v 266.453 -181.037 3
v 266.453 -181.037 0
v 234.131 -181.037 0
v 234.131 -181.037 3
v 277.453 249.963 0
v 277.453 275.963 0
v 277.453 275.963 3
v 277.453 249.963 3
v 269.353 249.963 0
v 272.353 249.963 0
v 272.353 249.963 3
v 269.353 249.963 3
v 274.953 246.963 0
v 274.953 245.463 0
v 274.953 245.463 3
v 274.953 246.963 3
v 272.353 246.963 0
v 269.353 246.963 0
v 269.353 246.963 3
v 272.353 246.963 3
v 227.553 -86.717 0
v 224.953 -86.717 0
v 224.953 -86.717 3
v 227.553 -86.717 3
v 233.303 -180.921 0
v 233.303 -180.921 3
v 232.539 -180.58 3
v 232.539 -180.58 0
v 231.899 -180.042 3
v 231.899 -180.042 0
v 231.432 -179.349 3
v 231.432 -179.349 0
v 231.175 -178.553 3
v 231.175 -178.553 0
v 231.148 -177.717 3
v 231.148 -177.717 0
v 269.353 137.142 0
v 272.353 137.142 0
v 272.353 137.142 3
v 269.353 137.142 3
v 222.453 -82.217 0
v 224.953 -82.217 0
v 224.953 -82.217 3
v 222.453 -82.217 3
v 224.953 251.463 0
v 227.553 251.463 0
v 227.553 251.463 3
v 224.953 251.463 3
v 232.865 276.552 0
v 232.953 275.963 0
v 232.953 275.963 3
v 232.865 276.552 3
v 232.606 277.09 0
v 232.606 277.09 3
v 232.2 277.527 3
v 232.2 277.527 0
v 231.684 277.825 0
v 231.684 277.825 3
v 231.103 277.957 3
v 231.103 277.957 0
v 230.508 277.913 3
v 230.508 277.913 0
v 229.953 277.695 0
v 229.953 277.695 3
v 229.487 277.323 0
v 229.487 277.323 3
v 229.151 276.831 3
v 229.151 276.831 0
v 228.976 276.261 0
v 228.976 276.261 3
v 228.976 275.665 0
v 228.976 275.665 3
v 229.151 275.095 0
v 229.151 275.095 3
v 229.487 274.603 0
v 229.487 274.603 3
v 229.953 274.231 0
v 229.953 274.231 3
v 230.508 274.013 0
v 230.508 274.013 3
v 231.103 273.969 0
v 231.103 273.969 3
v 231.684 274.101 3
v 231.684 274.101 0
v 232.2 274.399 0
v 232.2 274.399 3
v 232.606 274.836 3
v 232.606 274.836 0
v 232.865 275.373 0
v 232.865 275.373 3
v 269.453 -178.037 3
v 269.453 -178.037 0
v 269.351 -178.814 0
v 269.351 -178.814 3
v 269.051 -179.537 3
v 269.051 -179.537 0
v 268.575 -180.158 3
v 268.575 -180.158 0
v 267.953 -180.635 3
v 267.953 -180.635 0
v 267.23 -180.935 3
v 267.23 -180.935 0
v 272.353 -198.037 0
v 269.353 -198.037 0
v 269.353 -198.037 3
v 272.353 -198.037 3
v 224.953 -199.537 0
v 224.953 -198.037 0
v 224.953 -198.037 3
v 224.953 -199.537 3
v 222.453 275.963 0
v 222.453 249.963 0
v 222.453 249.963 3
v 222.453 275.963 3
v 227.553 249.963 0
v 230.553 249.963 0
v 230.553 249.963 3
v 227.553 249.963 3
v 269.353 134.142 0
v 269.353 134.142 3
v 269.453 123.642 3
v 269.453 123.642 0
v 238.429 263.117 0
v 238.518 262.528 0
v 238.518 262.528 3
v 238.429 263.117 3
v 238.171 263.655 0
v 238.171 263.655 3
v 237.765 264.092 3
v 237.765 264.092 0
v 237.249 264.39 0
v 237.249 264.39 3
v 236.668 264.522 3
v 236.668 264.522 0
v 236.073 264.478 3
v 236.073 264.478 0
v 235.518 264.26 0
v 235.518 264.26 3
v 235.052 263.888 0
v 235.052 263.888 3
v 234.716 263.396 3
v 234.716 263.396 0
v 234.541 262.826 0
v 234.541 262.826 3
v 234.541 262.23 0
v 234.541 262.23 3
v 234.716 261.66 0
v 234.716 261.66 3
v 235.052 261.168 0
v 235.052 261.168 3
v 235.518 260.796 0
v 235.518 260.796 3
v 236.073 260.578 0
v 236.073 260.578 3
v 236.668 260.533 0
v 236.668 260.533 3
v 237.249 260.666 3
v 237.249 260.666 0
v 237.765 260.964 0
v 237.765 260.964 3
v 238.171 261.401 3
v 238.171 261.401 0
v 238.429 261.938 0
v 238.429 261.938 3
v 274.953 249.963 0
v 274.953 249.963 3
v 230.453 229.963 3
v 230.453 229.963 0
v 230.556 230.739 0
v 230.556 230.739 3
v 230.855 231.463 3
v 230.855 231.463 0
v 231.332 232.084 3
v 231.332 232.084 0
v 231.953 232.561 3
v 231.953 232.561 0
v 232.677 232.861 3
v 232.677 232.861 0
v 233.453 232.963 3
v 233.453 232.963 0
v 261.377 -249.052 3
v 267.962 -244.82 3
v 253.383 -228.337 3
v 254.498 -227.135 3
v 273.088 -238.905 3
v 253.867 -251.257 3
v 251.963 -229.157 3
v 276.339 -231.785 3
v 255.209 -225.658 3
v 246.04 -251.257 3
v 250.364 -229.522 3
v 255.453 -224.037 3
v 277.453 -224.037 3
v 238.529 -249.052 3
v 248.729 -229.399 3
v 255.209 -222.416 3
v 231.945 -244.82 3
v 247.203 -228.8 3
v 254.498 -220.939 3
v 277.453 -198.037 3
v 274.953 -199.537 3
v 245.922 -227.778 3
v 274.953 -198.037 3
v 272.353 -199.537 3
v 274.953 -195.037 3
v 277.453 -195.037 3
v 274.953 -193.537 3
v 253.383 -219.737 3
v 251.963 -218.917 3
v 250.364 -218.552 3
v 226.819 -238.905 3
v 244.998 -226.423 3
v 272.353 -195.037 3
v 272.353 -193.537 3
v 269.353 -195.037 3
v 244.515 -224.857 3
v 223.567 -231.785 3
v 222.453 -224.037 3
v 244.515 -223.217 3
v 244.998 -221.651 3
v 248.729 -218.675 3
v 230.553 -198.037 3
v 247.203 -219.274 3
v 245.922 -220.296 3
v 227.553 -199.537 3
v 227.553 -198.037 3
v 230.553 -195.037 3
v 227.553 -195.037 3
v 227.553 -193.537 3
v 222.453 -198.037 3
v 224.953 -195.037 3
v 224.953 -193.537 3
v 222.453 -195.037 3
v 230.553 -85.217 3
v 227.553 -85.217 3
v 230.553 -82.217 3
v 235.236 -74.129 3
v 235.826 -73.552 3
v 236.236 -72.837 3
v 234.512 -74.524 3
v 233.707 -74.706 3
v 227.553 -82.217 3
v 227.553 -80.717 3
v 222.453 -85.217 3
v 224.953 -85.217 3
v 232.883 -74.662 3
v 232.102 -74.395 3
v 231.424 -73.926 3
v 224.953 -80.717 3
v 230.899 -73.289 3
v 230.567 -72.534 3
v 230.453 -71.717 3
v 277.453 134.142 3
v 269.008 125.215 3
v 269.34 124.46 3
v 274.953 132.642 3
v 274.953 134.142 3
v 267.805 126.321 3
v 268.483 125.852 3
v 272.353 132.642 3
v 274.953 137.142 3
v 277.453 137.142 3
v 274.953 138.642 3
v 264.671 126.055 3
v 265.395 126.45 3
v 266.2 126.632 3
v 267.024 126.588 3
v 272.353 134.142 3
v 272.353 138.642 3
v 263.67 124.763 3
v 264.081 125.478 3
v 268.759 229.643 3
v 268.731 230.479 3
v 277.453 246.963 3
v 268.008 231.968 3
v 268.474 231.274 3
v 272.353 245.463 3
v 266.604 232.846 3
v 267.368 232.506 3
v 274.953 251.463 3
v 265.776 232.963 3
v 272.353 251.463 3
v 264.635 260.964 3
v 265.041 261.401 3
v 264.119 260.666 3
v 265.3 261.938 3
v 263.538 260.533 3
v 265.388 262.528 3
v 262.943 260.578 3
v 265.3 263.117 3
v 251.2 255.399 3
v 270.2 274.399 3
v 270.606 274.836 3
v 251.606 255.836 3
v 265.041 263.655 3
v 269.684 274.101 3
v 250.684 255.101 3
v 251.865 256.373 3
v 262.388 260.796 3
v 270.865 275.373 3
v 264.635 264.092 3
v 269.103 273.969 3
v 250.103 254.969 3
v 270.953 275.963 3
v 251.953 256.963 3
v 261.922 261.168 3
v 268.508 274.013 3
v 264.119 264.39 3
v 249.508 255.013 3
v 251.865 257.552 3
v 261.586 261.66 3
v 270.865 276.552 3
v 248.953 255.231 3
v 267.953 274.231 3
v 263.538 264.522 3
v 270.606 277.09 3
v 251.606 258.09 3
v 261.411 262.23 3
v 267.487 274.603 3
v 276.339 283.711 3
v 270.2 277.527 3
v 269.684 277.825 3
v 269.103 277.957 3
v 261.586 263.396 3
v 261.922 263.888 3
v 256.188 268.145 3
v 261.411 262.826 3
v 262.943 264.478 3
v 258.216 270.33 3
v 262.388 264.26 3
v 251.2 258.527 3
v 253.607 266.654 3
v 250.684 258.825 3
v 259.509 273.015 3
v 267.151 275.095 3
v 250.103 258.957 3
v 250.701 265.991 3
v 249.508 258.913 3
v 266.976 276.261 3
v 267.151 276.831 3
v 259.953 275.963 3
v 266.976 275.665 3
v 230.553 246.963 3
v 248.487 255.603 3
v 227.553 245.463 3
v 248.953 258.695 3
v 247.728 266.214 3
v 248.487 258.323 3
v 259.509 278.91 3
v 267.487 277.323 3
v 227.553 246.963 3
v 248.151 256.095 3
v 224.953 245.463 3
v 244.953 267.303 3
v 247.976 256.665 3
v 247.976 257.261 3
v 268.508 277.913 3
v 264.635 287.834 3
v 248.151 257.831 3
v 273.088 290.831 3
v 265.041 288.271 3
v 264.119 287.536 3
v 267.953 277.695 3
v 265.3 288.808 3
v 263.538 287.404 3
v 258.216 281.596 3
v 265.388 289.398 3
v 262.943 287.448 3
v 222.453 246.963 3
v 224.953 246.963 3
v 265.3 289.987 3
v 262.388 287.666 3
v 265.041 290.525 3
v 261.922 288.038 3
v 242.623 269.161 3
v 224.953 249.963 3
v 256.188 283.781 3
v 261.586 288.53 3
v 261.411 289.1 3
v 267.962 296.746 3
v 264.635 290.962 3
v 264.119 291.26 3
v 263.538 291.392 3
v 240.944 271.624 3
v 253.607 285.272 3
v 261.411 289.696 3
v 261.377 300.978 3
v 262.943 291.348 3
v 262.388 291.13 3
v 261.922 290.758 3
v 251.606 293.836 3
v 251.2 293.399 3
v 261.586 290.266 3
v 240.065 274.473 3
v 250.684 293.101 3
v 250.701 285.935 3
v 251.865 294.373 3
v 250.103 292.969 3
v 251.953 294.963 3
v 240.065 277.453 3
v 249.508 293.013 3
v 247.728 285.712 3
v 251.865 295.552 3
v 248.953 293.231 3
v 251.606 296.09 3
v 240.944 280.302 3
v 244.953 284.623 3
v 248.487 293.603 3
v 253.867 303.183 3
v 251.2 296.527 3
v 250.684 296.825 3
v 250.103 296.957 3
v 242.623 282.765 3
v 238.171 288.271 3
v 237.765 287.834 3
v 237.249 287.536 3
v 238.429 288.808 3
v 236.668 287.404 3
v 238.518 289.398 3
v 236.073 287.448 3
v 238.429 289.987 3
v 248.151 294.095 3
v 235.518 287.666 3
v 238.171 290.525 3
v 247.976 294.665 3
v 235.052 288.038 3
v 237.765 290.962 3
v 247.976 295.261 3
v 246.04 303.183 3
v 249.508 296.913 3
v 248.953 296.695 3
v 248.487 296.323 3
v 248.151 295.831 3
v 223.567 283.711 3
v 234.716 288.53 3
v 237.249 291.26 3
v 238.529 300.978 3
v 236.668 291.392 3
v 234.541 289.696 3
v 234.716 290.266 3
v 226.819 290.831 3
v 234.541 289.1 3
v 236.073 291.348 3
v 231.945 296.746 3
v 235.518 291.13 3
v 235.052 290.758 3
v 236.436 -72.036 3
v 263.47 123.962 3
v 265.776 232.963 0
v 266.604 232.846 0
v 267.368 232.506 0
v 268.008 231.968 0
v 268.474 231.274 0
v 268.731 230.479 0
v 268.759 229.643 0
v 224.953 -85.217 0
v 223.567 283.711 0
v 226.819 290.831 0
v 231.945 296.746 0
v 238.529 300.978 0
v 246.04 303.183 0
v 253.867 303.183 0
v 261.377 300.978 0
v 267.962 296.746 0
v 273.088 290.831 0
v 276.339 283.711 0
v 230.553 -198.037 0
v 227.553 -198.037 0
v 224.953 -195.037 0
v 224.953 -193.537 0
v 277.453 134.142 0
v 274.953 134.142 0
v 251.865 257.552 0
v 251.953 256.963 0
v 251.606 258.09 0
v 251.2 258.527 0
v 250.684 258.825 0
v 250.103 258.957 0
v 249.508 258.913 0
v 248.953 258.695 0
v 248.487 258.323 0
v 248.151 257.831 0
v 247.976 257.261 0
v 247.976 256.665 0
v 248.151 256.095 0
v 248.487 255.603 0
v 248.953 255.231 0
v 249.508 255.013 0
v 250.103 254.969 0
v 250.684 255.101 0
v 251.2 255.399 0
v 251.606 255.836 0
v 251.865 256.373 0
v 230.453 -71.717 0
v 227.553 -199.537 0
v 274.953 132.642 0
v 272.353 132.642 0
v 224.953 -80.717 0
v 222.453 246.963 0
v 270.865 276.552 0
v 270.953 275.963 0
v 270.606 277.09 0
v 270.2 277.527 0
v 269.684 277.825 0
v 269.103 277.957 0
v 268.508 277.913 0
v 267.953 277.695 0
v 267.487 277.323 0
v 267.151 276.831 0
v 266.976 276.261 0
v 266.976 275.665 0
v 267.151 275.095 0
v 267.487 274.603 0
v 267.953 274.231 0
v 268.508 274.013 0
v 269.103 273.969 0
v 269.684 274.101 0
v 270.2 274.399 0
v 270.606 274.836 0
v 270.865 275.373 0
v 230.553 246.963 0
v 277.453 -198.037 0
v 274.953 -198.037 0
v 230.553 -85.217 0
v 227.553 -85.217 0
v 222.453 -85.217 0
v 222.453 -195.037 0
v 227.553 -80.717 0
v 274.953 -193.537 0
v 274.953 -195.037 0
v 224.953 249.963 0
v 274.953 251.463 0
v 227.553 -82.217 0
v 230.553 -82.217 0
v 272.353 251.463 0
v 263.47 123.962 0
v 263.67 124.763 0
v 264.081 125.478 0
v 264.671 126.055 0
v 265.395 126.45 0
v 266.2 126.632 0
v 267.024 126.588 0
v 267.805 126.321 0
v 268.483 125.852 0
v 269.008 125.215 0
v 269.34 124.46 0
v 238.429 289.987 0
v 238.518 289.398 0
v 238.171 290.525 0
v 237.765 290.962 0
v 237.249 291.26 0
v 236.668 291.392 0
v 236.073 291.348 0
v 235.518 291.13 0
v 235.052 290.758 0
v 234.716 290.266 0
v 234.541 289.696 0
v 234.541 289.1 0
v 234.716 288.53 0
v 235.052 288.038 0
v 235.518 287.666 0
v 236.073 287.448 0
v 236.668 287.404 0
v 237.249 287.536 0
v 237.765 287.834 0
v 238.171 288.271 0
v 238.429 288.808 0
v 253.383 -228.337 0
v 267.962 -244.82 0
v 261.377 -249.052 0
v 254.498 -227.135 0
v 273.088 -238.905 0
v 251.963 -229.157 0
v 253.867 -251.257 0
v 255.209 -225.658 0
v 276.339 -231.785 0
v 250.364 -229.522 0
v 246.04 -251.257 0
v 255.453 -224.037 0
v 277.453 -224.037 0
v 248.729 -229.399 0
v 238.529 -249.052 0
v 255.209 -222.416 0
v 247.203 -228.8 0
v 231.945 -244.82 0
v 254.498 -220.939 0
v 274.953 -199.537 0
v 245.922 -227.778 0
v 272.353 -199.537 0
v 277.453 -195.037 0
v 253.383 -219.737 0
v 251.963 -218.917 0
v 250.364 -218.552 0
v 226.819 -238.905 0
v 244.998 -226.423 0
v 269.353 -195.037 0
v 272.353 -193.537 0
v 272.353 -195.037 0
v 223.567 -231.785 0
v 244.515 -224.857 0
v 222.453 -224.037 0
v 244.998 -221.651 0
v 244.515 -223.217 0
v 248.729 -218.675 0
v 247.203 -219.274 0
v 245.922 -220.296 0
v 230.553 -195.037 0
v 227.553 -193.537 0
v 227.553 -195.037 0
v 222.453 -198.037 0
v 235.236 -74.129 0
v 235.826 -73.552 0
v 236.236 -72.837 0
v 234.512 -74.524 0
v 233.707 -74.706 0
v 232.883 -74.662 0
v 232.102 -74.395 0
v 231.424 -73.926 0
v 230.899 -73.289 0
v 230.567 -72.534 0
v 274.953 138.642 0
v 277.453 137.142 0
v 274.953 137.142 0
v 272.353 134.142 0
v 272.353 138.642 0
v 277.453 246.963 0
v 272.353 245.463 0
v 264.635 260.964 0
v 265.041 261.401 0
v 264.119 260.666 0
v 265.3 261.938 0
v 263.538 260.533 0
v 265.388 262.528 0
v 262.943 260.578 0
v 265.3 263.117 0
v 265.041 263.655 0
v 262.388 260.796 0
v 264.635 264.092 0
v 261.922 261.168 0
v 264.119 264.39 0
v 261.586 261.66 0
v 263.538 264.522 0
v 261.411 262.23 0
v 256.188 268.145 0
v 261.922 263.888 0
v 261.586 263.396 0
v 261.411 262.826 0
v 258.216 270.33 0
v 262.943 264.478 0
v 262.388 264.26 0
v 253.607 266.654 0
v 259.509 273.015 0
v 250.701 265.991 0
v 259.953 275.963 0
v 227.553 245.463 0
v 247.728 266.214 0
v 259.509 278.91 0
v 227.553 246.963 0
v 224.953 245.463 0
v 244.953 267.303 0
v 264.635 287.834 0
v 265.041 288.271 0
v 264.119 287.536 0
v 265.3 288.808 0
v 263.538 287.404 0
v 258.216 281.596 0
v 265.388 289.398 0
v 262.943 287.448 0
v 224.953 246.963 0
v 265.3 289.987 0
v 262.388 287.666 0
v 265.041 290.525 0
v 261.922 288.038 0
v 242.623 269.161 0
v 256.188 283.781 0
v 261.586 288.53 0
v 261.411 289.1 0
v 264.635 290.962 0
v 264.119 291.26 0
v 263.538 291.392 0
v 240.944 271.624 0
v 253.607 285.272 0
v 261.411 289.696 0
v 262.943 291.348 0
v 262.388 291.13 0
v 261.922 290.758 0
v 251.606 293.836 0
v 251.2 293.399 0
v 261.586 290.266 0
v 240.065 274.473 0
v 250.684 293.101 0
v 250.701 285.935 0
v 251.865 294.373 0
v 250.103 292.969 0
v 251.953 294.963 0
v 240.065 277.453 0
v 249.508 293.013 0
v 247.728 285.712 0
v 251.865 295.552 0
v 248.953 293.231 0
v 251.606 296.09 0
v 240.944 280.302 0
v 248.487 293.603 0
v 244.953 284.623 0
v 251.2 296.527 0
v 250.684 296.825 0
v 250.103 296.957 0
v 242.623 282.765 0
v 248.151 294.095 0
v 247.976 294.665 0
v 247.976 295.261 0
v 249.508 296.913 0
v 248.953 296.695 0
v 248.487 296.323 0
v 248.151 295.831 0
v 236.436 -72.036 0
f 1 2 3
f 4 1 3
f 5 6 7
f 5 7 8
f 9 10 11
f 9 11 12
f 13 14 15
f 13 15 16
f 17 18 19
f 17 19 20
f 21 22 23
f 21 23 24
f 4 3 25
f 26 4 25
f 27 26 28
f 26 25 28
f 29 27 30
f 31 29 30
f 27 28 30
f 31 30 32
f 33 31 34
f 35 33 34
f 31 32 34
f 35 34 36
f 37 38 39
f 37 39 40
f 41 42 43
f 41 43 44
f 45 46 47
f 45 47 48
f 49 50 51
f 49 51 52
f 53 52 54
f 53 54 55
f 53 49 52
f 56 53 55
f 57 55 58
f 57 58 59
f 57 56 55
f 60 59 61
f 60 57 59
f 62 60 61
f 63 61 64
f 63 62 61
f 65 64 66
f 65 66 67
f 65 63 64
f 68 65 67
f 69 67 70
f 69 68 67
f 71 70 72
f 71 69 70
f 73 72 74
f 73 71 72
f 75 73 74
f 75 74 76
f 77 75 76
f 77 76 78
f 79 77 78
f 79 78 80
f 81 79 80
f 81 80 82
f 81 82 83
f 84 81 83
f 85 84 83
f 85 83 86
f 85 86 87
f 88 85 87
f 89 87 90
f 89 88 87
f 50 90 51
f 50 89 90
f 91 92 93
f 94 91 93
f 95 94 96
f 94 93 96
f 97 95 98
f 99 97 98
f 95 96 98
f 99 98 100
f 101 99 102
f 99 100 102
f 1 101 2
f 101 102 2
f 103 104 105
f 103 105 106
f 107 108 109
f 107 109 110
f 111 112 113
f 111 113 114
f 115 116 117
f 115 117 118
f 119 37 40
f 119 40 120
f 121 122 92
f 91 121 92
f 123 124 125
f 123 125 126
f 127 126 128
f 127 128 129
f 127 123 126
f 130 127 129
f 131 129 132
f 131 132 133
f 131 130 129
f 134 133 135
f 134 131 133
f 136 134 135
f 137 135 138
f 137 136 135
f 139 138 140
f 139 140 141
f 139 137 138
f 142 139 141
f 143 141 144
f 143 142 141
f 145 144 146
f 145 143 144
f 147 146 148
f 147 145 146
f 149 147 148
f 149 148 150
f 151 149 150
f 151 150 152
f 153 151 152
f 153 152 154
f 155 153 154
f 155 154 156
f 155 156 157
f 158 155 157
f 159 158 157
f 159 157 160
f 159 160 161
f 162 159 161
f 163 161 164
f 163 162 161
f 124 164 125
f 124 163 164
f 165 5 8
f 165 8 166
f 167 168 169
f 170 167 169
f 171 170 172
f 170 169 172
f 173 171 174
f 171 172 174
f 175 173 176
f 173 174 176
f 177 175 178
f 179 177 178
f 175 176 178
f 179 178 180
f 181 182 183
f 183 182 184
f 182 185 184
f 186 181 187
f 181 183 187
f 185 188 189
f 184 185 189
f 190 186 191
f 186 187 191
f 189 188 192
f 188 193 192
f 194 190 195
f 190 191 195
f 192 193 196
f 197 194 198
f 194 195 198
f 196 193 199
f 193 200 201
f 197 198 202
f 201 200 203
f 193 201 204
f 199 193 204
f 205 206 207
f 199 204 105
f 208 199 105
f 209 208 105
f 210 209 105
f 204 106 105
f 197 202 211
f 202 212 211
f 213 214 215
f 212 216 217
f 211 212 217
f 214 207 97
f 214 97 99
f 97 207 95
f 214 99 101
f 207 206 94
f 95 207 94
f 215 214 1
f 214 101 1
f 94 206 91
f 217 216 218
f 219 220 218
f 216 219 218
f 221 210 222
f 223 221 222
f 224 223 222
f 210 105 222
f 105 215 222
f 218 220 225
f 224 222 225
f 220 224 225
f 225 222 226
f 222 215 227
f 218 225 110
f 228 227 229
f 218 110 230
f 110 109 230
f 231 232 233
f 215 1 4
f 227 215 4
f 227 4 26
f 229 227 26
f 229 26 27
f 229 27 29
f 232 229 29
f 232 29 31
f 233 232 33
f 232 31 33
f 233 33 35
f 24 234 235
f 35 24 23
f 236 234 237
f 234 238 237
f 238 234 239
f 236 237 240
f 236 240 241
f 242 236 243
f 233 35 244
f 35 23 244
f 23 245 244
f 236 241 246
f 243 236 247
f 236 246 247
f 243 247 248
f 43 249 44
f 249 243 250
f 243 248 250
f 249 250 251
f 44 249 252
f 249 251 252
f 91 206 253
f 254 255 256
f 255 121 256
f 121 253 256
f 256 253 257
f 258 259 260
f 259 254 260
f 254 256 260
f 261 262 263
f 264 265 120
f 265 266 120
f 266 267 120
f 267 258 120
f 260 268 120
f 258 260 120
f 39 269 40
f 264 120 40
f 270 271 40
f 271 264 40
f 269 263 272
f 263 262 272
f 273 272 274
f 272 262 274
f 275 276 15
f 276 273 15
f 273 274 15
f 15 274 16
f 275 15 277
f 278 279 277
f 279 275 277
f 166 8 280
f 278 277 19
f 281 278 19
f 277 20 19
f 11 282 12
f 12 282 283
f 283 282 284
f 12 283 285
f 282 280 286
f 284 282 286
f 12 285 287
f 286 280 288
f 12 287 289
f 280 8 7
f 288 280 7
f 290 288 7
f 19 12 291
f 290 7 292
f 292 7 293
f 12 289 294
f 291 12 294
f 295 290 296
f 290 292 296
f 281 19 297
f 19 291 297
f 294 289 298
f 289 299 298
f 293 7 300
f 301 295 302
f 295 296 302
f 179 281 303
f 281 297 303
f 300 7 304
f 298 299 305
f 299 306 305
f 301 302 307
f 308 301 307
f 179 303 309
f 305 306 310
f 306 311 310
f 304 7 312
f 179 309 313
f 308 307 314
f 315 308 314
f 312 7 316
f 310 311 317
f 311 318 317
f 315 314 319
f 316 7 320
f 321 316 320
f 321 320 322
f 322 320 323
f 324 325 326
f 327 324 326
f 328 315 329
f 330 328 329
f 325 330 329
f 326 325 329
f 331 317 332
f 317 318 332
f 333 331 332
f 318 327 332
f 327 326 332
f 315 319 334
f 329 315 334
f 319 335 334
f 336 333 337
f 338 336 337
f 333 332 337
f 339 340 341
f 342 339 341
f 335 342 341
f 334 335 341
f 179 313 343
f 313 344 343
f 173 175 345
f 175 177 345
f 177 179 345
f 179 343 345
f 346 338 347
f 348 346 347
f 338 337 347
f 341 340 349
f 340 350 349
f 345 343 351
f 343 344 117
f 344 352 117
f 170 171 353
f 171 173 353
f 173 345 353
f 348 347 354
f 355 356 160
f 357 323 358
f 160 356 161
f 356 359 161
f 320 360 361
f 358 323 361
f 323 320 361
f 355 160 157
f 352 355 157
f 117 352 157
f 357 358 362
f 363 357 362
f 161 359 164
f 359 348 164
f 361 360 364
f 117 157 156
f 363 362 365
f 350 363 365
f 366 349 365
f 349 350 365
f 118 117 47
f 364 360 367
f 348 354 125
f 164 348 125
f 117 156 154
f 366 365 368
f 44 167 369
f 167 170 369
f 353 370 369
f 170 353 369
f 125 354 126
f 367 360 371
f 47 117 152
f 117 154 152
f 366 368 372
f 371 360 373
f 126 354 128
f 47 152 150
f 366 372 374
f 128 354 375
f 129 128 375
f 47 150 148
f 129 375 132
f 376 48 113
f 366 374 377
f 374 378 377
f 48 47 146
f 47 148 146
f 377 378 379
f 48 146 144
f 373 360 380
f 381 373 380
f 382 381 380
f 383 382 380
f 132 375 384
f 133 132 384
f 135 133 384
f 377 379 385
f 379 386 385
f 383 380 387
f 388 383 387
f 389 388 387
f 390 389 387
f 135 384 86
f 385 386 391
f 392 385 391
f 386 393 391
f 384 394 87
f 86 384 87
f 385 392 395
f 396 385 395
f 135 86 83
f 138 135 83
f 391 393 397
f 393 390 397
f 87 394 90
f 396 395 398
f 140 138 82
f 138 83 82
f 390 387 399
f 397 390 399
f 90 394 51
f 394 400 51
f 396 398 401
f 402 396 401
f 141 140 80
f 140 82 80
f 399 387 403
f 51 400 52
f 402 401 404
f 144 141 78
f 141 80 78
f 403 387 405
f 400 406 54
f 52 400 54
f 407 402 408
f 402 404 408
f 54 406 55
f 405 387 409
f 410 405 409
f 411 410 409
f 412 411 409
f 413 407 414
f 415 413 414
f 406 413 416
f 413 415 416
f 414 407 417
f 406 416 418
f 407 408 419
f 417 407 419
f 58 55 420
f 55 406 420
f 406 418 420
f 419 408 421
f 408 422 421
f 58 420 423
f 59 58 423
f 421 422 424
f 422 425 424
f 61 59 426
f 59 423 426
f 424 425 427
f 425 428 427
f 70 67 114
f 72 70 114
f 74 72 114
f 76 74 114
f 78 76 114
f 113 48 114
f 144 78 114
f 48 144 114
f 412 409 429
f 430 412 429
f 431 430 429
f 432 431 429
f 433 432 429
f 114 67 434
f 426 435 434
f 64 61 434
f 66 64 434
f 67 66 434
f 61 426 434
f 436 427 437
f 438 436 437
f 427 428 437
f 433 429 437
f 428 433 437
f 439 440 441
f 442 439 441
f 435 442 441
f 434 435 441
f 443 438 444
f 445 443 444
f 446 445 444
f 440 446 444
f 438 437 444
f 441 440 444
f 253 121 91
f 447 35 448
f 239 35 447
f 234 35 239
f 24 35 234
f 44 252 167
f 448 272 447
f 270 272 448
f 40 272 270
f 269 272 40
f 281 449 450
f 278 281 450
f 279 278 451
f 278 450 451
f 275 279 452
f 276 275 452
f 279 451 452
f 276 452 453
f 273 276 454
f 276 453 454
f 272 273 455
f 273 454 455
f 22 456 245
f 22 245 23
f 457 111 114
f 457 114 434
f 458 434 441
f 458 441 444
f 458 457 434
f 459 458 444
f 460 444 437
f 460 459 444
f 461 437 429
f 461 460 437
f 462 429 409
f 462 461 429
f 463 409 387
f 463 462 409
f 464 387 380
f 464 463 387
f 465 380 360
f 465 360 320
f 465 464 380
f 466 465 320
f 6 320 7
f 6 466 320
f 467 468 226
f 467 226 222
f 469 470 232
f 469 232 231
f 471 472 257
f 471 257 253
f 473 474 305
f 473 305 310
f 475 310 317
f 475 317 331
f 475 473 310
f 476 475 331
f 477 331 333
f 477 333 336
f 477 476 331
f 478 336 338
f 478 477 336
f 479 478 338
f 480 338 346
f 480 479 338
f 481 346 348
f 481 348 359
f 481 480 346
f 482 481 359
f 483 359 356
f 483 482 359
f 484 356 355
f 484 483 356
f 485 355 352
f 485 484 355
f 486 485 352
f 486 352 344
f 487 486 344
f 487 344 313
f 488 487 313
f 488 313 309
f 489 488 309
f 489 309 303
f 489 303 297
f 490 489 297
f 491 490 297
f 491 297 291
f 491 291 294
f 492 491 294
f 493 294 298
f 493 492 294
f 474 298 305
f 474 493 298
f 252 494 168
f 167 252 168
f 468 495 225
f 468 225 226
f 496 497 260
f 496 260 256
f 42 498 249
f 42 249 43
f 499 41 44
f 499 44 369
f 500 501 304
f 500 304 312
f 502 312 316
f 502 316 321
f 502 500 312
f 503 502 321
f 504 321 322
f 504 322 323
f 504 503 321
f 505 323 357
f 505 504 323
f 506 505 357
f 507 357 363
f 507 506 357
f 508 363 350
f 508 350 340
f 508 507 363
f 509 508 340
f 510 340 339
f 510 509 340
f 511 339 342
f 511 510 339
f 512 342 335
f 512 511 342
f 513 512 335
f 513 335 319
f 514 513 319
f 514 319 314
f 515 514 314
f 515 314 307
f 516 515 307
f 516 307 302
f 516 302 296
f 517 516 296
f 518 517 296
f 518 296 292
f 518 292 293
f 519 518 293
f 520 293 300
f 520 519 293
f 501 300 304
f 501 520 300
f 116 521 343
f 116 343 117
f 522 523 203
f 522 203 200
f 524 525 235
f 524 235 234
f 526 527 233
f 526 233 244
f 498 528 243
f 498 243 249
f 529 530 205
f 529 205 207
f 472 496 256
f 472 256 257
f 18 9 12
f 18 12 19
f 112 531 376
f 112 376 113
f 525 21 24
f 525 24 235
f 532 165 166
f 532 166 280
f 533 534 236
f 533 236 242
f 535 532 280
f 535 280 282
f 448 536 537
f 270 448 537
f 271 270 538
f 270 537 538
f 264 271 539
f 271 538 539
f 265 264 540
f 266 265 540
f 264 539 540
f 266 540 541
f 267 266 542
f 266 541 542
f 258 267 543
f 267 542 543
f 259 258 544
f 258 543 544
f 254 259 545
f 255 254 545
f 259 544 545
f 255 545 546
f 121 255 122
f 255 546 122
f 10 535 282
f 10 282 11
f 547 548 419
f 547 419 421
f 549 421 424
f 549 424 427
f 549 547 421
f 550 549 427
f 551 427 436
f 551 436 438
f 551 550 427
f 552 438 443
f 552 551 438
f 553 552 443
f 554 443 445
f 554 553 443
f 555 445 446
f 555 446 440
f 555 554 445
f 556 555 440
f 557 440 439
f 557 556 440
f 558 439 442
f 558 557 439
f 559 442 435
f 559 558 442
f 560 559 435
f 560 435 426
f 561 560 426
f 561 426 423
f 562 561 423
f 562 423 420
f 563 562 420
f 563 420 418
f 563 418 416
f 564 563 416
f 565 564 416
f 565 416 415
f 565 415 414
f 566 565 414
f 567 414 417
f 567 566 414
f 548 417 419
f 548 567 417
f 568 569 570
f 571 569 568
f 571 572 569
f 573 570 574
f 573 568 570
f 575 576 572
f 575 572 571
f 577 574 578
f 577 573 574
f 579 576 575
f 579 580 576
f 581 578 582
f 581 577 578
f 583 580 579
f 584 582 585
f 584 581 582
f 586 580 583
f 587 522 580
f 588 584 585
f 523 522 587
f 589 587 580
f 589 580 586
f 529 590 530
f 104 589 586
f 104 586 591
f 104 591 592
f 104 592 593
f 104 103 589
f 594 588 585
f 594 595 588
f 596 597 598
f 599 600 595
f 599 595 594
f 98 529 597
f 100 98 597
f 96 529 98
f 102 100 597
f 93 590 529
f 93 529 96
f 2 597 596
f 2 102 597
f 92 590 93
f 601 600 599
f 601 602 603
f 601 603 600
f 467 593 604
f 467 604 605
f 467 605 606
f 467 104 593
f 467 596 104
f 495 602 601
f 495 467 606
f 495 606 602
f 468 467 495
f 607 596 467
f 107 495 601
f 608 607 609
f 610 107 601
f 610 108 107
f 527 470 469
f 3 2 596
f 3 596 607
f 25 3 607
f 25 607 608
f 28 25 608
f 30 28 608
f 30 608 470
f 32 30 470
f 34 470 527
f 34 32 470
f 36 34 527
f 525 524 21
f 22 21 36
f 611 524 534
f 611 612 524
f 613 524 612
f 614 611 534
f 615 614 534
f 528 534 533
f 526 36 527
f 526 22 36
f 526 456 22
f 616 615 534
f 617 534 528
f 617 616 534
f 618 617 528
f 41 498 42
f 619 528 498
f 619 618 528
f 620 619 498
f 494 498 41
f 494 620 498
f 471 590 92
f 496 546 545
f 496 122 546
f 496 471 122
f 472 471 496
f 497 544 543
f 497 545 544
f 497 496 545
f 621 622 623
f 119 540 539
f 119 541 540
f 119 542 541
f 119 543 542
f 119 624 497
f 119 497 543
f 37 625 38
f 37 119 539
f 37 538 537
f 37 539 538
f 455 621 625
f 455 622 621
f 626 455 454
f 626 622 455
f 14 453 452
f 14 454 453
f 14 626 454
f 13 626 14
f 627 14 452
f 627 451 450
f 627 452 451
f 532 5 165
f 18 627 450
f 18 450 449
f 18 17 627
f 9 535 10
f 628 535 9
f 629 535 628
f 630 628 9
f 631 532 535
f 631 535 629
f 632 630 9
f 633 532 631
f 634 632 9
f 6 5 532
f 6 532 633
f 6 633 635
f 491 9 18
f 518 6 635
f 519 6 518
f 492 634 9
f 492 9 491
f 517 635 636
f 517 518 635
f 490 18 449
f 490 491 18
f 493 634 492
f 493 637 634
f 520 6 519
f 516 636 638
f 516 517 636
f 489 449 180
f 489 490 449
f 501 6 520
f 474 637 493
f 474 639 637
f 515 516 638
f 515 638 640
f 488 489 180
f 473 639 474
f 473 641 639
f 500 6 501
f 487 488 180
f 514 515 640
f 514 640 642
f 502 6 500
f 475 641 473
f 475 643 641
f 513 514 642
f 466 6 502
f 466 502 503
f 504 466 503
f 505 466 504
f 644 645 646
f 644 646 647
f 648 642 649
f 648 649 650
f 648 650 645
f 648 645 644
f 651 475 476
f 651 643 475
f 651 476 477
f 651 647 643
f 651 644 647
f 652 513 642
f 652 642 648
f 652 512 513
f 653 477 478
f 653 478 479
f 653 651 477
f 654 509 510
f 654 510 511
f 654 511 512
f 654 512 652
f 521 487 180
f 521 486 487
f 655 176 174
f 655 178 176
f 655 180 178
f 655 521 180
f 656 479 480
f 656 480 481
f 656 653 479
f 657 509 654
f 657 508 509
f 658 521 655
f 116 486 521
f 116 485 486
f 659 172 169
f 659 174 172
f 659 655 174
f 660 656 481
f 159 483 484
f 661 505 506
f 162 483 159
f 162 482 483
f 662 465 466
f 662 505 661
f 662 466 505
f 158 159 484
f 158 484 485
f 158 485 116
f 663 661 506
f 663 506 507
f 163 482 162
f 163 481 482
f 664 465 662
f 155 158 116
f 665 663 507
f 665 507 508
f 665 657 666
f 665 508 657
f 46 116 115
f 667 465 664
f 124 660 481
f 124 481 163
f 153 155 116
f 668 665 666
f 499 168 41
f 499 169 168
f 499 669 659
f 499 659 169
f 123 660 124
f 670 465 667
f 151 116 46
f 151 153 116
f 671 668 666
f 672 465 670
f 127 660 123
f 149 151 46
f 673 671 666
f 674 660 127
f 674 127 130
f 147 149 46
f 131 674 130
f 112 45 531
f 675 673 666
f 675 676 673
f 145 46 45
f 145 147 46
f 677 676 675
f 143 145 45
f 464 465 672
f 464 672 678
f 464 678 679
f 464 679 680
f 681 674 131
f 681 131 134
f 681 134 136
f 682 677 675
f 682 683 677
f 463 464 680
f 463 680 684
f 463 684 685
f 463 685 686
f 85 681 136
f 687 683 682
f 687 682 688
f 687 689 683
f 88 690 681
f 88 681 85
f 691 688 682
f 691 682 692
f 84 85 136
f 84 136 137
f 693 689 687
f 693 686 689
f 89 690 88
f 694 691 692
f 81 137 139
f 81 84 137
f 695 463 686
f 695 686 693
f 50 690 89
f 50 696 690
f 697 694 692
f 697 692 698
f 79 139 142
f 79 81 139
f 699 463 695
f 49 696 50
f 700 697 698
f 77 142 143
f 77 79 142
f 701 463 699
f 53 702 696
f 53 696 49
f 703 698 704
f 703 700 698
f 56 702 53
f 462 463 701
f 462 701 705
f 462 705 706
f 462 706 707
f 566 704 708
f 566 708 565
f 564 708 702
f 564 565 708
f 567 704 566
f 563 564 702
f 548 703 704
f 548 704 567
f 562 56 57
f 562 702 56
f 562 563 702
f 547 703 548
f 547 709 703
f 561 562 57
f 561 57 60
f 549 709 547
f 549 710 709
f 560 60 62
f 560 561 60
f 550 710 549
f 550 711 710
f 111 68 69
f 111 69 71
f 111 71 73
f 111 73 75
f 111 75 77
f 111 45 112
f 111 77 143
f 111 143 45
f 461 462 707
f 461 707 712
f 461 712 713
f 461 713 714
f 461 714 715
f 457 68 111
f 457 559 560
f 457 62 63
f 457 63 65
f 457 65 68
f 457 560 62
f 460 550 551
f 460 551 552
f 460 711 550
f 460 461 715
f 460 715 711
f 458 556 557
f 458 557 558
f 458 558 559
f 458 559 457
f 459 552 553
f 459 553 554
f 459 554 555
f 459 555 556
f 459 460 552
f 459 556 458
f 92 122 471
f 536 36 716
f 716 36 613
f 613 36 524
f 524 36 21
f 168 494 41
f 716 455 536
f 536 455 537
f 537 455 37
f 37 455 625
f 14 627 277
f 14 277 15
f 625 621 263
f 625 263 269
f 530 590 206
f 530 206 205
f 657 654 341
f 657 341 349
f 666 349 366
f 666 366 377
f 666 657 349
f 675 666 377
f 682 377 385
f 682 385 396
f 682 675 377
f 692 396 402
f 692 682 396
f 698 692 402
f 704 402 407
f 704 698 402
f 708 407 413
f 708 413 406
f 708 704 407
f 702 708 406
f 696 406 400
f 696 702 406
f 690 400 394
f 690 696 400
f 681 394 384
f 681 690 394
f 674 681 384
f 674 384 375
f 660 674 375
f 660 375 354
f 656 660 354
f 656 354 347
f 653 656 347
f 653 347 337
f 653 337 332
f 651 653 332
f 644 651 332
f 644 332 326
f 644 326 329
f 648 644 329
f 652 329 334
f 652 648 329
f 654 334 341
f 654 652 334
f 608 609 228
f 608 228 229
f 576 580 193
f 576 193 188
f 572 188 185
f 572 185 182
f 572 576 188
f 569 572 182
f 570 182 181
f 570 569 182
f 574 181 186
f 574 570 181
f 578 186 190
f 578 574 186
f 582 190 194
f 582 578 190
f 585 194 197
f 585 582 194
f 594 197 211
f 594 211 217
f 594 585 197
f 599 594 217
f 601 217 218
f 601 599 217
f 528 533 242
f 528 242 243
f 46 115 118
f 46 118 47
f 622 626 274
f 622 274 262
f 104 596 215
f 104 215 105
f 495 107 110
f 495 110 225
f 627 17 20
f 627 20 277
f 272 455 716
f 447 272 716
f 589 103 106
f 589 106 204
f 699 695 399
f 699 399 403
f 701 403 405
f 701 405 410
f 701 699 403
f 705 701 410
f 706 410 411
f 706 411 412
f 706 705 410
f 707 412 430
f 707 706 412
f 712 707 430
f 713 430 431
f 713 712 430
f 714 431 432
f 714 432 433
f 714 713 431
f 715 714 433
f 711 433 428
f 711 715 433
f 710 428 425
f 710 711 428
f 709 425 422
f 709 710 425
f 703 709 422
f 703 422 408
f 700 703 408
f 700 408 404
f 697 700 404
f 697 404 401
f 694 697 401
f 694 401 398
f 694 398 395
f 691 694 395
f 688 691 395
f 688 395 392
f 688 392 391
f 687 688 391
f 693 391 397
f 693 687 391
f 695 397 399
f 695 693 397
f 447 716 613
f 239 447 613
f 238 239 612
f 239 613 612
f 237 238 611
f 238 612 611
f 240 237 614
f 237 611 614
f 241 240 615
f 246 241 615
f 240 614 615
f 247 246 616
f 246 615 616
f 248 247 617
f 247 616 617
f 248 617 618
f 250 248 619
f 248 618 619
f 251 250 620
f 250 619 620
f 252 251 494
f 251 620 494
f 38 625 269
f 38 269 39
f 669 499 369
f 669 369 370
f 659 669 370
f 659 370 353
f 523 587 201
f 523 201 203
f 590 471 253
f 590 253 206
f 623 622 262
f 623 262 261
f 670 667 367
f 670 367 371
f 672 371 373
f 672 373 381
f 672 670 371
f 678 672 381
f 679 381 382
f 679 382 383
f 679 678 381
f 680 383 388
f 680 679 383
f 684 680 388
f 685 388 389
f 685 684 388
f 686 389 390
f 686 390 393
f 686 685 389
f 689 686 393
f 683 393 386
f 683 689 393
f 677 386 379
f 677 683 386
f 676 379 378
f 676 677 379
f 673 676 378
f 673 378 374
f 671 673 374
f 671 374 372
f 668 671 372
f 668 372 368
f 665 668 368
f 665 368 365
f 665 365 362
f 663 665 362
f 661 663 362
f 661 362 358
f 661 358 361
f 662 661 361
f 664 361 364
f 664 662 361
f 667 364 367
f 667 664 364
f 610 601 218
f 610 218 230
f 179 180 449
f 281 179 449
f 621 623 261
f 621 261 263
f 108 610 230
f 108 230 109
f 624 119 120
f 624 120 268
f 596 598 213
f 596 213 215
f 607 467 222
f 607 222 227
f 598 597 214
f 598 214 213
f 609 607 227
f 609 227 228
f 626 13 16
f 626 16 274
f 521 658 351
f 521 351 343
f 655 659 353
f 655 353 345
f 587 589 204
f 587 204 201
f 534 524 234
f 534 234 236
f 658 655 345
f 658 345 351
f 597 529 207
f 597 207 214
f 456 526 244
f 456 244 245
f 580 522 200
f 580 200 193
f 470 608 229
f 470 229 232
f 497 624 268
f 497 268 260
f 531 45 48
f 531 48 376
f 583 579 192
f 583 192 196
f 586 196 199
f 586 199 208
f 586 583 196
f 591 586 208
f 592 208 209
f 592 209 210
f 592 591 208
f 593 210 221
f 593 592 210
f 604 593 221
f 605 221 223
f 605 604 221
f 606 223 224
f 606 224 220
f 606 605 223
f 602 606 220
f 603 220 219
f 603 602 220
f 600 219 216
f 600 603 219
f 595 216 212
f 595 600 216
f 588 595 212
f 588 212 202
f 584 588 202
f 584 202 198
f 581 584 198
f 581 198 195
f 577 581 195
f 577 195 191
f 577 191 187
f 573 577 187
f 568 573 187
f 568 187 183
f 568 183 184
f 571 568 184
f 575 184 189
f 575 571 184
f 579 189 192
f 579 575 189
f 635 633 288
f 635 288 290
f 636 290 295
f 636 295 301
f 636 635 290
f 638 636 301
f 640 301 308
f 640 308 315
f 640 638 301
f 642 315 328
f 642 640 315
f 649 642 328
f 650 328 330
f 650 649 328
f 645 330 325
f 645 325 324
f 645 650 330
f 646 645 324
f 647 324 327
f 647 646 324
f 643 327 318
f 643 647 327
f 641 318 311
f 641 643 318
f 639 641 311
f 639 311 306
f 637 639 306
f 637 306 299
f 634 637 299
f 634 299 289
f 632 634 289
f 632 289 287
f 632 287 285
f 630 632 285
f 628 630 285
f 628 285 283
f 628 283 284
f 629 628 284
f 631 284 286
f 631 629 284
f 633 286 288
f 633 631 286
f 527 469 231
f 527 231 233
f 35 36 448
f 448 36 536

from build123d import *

# Parameters (mm, degrees)
SKETCH_1_R      = 10
SKETCH_1_R_2    = 2
SKETCH_1_R_3    = 5.5
EXTRUDE_1_DEPTH = 3


with BuildPart() as part:
    # 草图1 → 凸台-拉伸1 (new body)
    with BuildSketch(Plane.XY):
        with BuildLine():
            Line((224.953360513, -85.216557036), (224.953360513, -86.716557036))
            Line((224.953360513, -86.716557036), (227.553360513, -86.716557036))
            Line((227.553360513, -86.716557036), (227.553360513, -85.216557036))
            Line((227.553360513, -85.216557036), (230.553360513, -85.216557036))
            Line((230.553360513, -85.216557036), (230.553360513, -82.216557036))
            Line((230.553360513, -82.216557036), (227.553360513, -82.216557036))
            Line((227.553360513, -82.216557036), (227.553360513, -80.716557036))
            Line((227.553360513, -80.716557036), (224.953360513, -80.716557036))
            Line((224.953360513, -80.716557036), (224.953360513, -82.216557036))
            Line((224.953360513, -82.216557036), (222.453360513, -82.216557036))
            Line((222.453360513, -82.216557036), (222.453360513, 246.962931603))
            Line((222.453360513, 246.962931603), (224.953360513, 246.962931603))
            Line((224.953360513, 246.962931603), (224.953360513, 245.462931603))
            Line((224.953360513, 245.462931603), (227.553360513, 245.462931603))
            Line((227.553360513, 245.462931603), (227.553360513, 246.962931603))
            Line((227.553360513, 246.962931603), (230.553360513, 246.962931603))
            Line((230.553360513, 246.962931603), (230.553360513, 249.962931603))
            Line((230.553360513, 249.962931603), (227.553360513, 249.962931603))
            Line((227.553360513, 249.962931603), (227.553360513, 251.462931603))
            Line((227.553360513, 251.462931603), (224.953360513, 251.462931603))
            Line((224.953360513, 251.462931603), (224.953360513, 249.962931603))
            Line((224.953360513, 249.962931603), (222.453360513, 249.962931603))
            Line((222.453360513, 249.962931603), (222.453360513, 275.962931603))
            ThreePointArc((222.453360513, 275.962931603), (249.953360513, 303.462931603), (277.453360513, 275.962931603))
            Line((277.453360513, 275.962931603), (277.453360513, 249.962931603))
            Line((277.453360513, 249.962931603), (274.953360513, 249.962931603))
            Line((274.953360513, 249.962931603), (274.953360513, 251.462931603))
            Line((274.953360513, 251.462931603), (272.353360513, 251.462931603))
            Line((272.353360513, 251.462931603), (272.353360513, 249.962931603))
            Line((272.353360513, 249.962931603), (269.353360513, 249.962931603))
            Line((269.353360513, 249.962931603), (269.353360513, 246.962931603))
            Line((269.353360513, 246.962931603), (272.353360513, 246.962931603))
            Line((272.353360513, 246.962931603), (272.353360513, 245.462931603))
            Line((272.353360513, 245.462931603), (274.953360513, 245.462931603))
            Line((274.953360513, 245.462931603), (274.953360513, 246.962931603))
            Line((274.953360513, 246.962931603), (277.453360513, 246.962931603))
            Line((277.453360513, 246.962931603), (277.453360513, 137.142420241))
            Line((277.453360513, 137.142420241), (274.953360513, 137.142420241))
            Line((274.953360513, 137.142420241), (274.953360513, 138.642420241))
            Line((274.953360513, 138.642420241), (272.353360513, 138.642420241))
            Line((272.353360513, 138.642420241), (272.353360513, 137.142420241))
            Line((272.353360513, 137.142420241), (269.353360513, 137.142420241))
            Line((269.353360513, 137.142420241), (269.353360513, 134.142420241))
            Line((269.353360513, 134.142420241), (272.353360513, 134.142420241))
            Line((272.353360513, 134.142420241), (272.353360513, 132.642420241))
            Line((272.353360513, 132.642420241), (274.953360513, 132.642420241))
            Line((274.953360513, 132.642420241), (274.953360513, 134.142420241))
            Line((274.953360513, 134.142420241), (277.453360513, 134.142420241))
            Line((277.453360513, 134.142420241), (277.453360513, -195.037068397))
            Line((277.453360513, -195.037068397), (274.953360513, -195.037068397))
            Line((274.953360513, -195.037068397), (274.953360513, -193.537068397))
            Line((274.953360513, -193.537068397), (272.353360513, -193.537068397))
            Line((272.353360513, -193.537068397), (272.353360513, -195.037068397))
            Line((272.353360513, -195.037068397), (269.353360513, -195.037068397))
            Line((269.353360513, -195.037068397), (269.353360513, -198.037068397))
            Line((269.353360513, -198.037068397), (272.353360513, -198.037068397))
            Line((272.353360513, -198.037068397), (272.353360513, -199.537068397))
            Line((272.353360513, -199.537068397), (274.953360513, -199.537068397))
            Line((274.953360513, -199.537068397), (274.953360513, -198.037068397))
            Line((274.953360513, -198.037068397), (277.453360513, -198.037068397))
            Line((277.453360513, -198.037068397), (277.453360513, -224.037068397))
            ThreePointArc((277.453360513, -224.037068397), (249.953360513, -251.537068397), (222.453360513, -224.037068397))
            Line((222.453360513, -224.037068397), (222.453360513, -198.037068397))
            Line((222.453360513, -198.037068397), (224.953360513, -198.037068397))
            Line((224.953360513, -198.037068397), (224.953360513, -199.537068397))
            Line((224.953360513, -199.537068397), (227.553360513, -199.537068397))
            Line((227.553360513, -199.537068397), (227.553360513, -198.037068397))
            Line((227.553360513, -198.037068397), (230.553360513, -198.037068397))
            Line((230.553360513, -198.037068397), (230.553360513, -195.037068397))
            Line((230.553360513, -195.037068397), (227.553360513, -195.037068397))
            Line((227.553360513, -195.037068397), (227.553360513, -193.537068397))
            Line((227.553360513, -193.537068397), (224.953360513, -193.537068397))
            Line((224.953360513, -193.537068397), (224.953360513, -195.037068397))
            Line((224.953360513, -195.037068397), (222.453360513, -195.037068397))
            Line((222.453360513, -195.037068397), (222.453360513, -85.216557036))
            Line((222.453360513, -85.216557036), (224.953360513, -85.216557036))
        make_face()
        with Locations((249.953360513, 275.962931603)):
            Circle(SKETCH_1_R, mode=Mode.SUBTRACT)
        with Locations((230.953360513, 275.962931603)):
            Circle(SKETCH_1_R_2, mode=Mode.SUBTRACT)
        with Locations((236.518331671, 289.397960445)):
            Circle(SKETCH_1_R_2, mode=Mode.SUBTRACT)
        with Locations((249.953360513, 294.962931603)):
            Circle(SKETCH_1_R_2, mode=Mode.SUBTRACT)
        with Locations((263.388389356, 289.397960445)):
            Circle(SKETCH_1_R_2, mode=Mode.SUBTRACT)
        with Locations((268.953360513, 275.962931603)):
            Circle(SKETCH_1_R_2, mode=Mode.SUBTRACT)
        with Locations((263.388389356, 262.52790276)):
            Circle(SKETCH_1_R_2, mode=Mode.SUBTRACT)
        with Locations((249.953360513, 256.962931603)):
            Circle(SKETCH_1_R_2, mode=Mode.SUBTRACT)
        with Locations((236.518331671, 262.52790276)):
            Circle(SKETCH_1_R_2, mode=Mode.SUBTRACT)
        with Locations((249.953360513, -224.037068397)):
            Circle(SKETCH_1_R_3, mode=Mode.SUBTRACT)
        with BuildLine():
            Line((233.453360513, 232.962931603), (265.776162867, 232.962931603))
            ThreePointArc((265.776162867, 232.962931603), (268.007619579, 231.968075224), (268.759090329, 229.643332232))
            Line((268.759090329, 229.643332232), (236.436287975, -72.036156407))
            ThreePointArc((236.436287975, -72.036156407), (233.293332993, -74.712285861), (230.453360513, -71.716557036))
            Line((230.453360513, -71.716557036), (230.453360513, 229.962931603))
            ThreePointArc((230.453360513, 229.962931603), (231.33204017, 232.084251946), (233.453360513, 232.962931603))
        make_face(mode=Mode.SUBTRACT)
        with BuildLine():
            Line((269.453360513, 123.642420241), (269.453360513, -178.037068397))
            ThreePointArc((269.453360513, -178.037068397), (268.574680857, -180.158388741), (266.453360513, -181.037068397))
            Line((266.453360513, -181.037068397), (234.130558159, -181.037068397))
            ThreePointArc((234.130558159, -181.037068397), (231.899101447, -180.042212019), (231.147630697, -177.717469026))
            Line((231.147630697, -177.717469026), (263.470433052, 123.962019612))
            ThreePointArc((263.470433052, 123.962019612), (266.613388034, 126.638149066), (269.453360513, 123.642420241))
        make_face(mode=Mode.SUBTRACT)
    extrude(amount=EXTRUDE_1_DEPTH)


solid = part.part
